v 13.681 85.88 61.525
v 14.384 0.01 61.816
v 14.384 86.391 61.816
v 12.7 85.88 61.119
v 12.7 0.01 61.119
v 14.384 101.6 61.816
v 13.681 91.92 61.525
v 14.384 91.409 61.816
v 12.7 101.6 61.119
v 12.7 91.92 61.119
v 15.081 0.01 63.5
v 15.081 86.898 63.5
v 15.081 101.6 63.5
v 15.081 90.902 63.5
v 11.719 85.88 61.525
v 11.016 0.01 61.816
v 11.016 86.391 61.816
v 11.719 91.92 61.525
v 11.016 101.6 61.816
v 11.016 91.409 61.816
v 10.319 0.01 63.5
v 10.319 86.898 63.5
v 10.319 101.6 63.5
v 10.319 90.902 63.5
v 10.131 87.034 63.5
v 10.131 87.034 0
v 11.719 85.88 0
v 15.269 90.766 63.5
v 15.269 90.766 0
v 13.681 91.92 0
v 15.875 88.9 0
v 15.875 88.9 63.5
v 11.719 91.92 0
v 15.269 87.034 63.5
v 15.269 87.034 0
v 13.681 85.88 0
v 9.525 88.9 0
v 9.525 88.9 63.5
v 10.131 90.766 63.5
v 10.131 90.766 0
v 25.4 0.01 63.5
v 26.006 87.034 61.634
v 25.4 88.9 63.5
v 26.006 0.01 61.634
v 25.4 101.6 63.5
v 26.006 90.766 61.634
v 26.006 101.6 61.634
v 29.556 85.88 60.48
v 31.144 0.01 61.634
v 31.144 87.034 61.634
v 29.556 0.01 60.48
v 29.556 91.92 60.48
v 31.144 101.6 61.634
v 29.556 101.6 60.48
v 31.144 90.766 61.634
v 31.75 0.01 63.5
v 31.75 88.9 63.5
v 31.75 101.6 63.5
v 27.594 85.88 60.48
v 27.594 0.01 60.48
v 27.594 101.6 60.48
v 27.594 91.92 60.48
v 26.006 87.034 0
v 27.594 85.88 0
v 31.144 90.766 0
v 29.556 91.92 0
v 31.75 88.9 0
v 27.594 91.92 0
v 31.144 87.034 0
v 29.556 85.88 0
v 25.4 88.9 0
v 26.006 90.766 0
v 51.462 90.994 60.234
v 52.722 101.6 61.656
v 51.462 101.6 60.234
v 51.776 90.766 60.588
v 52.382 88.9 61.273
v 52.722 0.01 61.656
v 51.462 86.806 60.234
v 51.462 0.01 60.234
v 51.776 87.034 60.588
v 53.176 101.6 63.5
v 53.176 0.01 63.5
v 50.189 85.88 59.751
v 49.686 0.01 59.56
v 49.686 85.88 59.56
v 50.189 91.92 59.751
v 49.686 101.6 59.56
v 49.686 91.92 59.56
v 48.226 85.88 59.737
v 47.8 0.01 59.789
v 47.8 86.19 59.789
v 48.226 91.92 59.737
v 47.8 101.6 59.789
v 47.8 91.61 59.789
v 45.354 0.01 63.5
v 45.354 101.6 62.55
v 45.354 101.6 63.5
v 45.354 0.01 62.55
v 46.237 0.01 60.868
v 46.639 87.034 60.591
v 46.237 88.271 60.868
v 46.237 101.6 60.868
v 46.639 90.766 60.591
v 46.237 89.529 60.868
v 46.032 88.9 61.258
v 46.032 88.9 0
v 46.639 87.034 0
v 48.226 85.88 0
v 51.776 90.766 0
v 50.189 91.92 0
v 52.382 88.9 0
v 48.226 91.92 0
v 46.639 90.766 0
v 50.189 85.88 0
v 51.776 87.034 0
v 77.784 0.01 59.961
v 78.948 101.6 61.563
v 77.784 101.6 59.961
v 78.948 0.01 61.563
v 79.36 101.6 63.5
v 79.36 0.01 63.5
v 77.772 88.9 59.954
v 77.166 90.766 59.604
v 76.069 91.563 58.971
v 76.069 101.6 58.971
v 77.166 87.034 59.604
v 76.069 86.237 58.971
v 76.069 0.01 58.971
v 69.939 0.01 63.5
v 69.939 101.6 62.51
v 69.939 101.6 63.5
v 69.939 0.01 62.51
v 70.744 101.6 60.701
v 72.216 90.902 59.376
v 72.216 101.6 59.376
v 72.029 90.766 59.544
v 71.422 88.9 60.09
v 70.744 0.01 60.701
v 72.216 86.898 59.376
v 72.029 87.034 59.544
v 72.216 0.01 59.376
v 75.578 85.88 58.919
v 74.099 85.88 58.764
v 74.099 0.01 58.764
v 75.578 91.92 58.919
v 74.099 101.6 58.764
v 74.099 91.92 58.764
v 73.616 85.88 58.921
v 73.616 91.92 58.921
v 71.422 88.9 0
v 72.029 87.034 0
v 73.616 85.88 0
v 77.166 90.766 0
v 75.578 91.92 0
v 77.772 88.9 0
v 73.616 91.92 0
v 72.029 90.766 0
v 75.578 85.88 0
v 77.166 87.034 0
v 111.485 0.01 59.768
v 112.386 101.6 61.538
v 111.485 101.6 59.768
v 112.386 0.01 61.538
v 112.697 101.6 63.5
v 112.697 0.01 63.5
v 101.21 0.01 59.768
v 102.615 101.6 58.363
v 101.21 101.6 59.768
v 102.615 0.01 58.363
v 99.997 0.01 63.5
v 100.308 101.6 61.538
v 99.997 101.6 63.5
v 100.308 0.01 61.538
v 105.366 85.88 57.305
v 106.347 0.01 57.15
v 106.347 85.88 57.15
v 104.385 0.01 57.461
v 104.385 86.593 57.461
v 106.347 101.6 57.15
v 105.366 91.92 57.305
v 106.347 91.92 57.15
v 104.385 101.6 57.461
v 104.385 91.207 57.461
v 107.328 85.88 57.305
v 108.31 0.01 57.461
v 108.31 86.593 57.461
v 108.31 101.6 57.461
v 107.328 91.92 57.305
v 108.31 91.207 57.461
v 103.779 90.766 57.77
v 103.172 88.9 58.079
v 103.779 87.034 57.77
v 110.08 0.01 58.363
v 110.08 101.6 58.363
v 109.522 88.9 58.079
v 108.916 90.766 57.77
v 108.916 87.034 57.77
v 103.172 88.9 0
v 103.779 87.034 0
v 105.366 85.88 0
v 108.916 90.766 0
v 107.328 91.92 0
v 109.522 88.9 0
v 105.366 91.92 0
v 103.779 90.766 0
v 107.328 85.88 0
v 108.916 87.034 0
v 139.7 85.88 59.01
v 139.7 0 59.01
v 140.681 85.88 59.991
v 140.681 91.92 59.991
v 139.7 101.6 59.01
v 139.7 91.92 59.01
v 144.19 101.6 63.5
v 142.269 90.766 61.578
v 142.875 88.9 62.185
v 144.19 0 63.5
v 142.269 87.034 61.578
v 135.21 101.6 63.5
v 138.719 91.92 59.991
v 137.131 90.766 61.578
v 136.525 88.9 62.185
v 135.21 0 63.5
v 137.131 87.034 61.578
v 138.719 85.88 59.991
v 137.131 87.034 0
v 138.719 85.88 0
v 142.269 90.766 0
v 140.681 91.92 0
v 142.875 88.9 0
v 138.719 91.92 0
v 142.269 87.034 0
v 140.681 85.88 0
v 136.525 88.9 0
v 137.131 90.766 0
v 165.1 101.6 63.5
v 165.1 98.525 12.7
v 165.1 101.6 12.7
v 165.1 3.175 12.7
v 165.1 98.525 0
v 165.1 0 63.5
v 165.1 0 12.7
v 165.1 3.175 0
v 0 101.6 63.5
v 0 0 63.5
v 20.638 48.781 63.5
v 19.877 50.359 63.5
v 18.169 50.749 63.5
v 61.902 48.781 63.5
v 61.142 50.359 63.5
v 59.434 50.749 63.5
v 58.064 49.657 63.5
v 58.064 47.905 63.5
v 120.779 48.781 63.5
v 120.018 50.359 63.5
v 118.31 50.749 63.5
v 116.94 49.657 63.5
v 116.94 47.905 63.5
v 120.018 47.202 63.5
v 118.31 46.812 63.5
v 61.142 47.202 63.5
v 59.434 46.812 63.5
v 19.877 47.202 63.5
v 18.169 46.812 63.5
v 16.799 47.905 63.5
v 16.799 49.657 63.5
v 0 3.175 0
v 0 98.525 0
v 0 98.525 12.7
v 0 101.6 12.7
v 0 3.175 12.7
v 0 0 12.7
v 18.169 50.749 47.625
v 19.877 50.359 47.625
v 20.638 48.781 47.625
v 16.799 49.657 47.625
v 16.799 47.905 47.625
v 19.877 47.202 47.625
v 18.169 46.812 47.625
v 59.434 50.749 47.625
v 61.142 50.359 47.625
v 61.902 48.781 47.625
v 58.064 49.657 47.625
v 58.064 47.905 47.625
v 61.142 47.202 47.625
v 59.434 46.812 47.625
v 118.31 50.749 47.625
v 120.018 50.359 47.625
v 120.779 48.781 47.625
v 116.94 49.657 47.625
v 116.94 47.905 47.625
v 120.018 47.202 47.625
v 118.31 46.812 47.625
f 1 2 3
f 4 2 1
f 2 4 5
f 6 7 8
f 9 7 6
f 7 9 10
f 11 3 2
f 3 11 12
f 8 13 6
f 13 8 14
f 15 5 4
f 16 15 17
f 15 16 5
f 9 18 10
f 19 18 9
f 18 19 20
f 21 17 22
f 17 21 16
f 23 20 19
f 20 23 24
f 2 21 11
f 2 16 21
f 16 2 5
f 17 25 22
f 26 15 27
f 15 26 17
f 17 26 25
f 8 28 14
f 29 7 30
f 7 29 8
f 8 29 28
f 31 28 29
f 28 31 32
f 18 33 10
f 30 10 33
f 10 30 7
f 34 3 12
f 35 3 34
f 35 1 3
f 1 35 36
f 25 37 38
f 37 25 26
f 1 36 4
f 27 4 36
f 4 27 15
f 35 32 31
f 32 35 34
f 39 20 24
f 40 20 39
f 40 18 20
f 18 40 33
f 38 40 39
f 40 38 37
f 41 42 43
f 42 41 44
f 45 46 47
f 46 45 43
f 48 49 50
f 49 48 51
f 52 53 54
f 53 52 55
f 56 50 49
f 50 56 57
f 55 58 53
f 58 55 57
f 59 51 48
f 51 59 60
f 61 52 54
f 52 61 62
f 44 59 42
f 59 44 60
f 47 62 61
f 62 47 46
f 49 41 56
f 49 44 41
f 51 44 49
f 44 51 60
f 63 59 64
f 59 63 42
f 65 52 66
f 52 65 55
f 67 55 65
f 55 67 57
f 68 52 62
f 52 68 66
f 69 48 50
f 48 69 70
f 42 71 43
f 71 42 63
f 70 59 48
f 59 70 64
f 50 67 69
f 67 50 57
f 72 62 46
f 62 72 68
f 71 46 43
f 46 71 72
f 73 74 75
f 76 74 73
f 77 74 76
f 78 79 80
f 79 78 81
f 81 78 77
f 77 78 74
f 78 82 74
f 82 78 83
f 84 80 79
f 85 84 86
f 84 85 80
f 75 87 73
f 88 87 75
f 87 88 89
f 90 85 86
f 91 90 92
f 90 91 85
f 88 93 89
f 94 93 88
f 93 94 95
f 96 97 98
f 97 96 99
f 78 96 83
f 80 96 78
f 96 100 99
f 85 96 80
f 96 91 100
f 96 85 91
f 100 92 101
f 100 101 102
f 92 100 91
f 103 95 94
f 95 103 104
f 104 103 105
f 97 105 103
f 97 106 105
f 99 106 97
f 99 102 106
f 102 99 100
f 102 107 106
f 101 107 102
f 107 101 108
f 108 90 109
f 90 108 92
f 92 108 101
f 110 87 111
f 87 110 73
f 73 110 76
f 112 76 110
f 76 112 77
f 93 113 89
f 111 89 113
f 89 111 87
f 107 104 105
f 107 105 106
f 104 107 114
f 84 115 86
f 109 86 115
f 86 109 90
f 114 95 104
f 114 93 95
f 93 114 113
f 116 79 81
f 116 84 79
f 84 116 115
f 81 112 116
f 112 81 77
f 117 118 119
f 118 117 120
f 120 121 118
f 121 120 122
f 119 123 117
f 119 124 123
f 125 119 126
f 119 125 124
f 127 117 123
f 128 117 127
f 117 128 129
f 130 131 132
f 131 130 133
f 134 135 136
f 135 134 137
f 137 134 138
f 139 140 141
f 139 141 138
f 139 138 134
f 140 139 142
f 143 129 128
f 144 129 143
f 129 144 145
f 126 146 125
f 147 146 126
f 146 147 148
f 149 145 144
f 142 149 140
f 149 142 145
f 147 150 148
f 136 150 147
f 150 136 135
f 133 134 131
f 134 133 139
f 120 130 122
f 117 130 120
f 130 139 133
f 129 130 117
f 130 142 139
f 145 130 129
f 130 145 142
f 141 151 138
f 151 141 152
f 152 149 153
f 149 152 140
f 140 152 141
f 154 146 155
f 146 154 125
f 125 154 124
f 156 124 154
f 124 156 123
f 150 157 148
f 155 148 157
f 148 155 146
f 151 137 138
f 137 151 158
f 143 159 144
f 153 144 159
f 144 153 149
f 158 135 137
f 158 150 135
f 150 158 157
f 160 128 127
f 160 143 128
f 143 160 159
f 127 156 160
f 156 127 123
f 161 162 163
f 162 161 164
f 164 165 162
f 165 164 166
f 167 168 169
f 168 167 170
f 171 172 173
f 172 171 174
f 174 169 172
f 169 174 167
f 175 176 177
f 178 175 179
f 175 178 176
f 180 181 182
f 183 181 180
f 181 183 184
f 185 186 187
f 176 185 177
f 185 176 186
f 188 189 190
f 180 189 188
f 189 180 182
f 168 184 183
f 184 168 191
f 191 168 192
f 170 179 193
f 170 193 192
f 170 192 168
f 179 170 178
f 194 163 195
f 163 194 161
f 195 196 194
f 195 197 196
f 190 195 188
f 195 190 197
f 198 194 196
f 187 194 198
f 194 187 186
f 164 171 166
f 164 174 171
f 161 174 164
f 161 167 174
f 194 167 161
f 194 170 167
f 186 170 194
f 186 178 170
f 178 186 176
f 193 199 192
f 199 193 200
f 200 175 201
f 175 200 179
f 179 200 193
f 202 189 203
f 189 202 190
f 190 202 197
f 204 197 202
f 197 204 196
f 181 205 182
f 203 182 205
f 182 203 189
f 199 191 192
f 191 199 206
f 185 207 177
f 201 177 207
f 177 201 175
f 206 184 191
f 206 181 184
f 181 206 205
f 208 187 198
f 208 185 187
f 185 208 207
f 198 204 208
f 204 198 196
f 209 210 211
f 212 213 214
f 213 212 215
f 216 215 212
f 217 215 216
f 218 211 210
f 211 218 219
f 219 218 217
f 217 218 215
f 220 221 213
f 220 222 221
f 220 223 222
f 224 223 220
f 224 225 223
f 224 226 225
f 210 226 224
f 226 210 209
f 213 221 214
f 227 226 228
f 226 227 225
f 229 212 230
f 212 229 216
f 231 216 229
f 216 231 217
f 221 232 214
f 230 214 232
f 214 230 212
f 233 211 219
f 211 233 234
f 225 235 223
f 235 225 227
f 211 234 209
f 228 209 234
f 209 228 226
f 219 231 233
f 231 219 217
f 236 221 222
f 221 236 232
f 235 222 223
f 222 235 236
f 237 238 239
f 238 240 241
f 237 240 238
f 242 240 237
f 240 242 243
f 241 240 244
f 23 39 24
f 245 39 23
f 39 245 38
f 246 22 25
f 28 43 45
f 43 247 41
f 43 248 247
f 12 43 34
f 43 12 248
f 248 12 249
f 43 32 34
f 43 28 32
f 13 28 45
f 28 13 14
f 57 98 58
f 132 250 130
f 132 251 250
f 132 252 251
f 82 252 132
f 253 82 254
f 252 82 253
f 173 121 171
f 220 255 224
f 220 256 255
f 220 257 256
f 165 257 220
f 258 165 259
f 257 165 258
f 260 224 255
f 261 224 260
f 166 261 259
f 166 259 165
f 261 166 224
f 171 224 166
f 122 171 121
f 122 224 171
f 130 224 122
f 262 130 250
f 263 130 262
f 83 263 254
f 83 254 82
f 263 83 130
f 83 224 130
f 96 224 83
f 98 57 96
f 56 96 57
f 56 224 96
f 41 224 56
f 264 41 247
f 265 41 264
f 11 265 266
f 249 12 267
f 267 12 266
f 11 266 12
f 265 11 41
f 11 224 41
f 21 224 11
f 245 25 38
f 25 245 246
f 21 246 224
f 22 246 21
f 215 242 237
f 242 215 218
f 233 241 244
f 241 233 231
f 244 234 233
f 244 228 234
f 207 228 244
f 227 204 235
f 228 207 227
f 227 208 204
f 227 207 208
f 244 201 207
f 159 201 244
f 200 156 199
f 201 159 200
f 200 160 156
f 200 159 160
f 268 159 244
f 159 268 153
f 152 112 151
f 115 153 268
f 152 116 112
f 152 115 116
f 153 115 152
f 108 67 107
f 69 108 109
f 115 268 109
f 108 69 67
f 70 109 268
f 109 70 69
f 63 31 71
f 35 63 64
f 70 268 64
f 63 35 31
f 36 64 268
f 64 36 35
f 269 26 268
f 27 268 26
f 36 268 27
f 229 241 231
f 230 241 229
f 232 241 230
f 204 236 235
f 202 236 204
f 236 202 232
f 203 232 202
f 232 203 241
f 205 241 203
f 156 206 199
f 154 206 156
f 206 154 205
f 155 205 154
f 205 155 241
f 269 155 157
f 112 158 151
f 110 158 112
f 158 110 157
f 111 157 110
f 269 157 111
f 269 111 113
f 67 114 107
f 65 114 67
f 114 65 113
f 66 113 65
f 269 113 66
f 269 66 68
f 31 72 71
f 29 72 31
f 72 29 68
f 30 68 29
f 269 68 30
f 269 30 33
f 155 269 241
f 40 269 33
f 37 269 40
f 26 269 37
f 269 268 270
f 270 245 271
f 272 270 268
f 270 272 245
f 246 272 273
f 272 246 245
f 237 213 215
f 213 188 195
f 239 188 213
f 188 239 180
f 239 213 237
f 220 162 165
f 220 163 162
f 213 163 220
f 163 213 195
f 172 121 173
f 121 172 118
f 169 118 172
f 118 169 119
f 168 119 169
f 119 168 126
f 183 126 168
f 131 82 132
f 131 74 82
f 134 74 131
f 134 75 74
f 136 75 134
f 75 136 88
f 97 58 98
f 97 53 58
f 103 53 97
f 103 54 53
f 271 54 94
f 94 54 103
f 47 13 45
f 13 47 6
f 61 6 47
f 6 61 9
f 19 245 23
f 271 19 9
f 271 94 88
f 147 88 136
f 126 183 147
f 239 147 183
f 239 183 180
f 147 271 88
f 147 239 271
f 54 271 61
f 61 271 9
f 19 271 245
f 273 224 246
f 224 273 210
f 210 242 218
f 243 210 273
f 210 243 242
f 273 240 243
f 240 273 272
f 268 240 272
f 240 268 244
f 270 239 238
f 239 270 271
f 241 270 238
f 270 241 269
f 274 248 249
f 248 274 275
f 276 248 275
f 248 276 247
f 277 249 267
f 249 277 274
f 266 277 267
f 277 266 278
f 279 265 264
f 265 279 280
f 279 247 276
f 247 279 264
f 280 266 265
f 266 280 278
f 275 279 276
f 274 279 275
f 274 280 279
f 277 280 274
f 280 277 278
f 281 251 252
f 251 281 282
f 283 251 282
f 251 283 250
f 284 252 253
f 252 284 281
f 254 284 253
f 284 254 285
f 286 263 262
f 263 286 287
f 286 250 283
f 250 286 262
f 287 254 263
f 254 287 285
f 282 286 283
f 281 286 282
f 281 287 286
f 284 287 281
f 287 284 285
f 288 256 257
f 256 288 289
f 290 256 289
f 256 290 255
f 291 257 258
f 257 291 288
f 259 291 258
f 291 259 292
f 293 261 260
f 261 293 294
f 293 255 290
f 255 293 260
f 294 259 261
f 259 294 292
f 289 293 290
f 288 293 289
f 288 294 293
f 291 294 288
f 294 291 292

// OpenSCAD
//options:

// block
x_len = 165.1; // 6.5" length 
y_len = 101.6; // 4" slot axis
z_len = 63.5; // 2.5" height

// ball-end mills (DOC is radius):
// a) 3/16 (0.1875 : 0.09375)
d_a = 4.7625 ;
r_a = 2.38125;
start_a = 12.7; // 1/2" from edge
echo("3/16 center:", (start_a + r_a), "depth: ", r_a); 
// b) 1/4 (0.25 : 0.125)
d_b = 6.35; 
r_b = 3.175;
start_b = start_a + d_a + (d_a + d_b);
echo("1/4 center:", (start_b + r_b), "depth: ", r_b); 
// c) 5/16 (0.3125 : 0.15625)
d_c = 7.93242; 
r_c = 3.96875;
start_c = start_b + d_b + (d_b + d_c);
echo("5/16 center:", (start_c + r_c), "depth: ", r_c); 
// d) 3/8 (0.375 : 0.1875)
d_d = 9.525;
r_d = 4.7625;
start_d = start_c + d_c + (d_c + d_d);
echo("3/8 center:", (start_d + r_d), "depth: ", r_d); 
// e) 1/2  (0.5 : 0.25)
d_e = 12.7; 
r_e = 6.35;
start_e = start_d + d_d + (d_d + d_e);
echo("1/2 center:", (start_e + r_e), "depth: ", r_e); 
//start_e = x_len - 12.7;
//z_e = z_len - r_e;
// f) 1/4" v slot
d_v = 6.35;
hyp_v = sqrt((d_v * d_v) + (d_v * d_v));
depth_v = (sin(45) * d_v);
start_v = x_len - (12.7*2) - (0.5 * hyp_v);
echo("1/4 V slot center:", (start_v + (hyp_v * 0.5)), "depth: ", depth_v); 
// shoulder depth: 1/8"
s_depth = 3.175;
echo("Shoulder: depth 1/8 Height: 1/2");
// through-hole: 1/4 oughta do it
h_d = 6.35;
h_y = y_len - (12.7); // 1/2" from end
echo("Thru-hole position", h_y);
// clamp-holes: 10/32 0.1590" tap drill
t_d = 4.0386;
t_r = 4.0386 * 0.5;
echo("Clamp hole 0.1590 drill 10-32 tap Position:", (y_len * 0.5));

module groove(start_x, rad) {
    translate([start_x, 0.01, z_len])
        rotate([-90, 0, 0])
            cylinder(y_len + 0.02, r=rad);
    // thru-hole
    translate([start_x, h_y, - 0.1])
        cylinder(z_len + 0.2, d=h_d);
}

module v_slot(start_x, side) {
    translate([start_x, 0 - 0.01, z_len])
        rotate([0, 45, 0])
            cube([side, y_len + 0.02, side]);
    // thru-hole
    translate([start_x + (hyp_v * 0.5), h_y, - 0.1])
        cylinder(z_len + 0.2, d=h_d);
}

module clamp_hole(start, end) {
    
    loc = ((end - start) * 0.5) - t_r;
    depth = z_len / 4;
    echo("CLAMP HOLE", (start + loc));
    translate([start + loc, ((y_len * 0.5) - t_r), z_len - depth])
        cylinder(depth + 0.1, d=t_d);
}

difference() {
    // tooling plate:
    cube([x_len, y_len, z_len]);
    // slots:
    //  3/16
    groove(start_a, r_a);
    // 1/4
    groove(start_b, r_b);
    // 5/15
    groove(start_c, r_c); 
    // 3/8
    groove(start_d, r_d);
     // 1/2
    groove(start_e, r_e);

    v_slot(start_v, d_v);
    
    // shoulders
    translate([-0.1, -0.1, 0])
        cube([x_len + 0.2, s_depth + 0.1, 12.7]);
    translate([-0.1, y_len - s_depth + 0.1, 0])
        cube([x_len + 0.2, s_depth + 0.1, 12.7]);
        
    // clamp holes
    //clamp_hole(0, start_a);
    clamp_hole(start_a, start_b);
    //clamp_hole(start_b, start_c);
    clamp_hole(start_c, start_d);
    //clamp_hole(start_d, start_e);
    clamp_hole(start_e, start_v);
        
};
